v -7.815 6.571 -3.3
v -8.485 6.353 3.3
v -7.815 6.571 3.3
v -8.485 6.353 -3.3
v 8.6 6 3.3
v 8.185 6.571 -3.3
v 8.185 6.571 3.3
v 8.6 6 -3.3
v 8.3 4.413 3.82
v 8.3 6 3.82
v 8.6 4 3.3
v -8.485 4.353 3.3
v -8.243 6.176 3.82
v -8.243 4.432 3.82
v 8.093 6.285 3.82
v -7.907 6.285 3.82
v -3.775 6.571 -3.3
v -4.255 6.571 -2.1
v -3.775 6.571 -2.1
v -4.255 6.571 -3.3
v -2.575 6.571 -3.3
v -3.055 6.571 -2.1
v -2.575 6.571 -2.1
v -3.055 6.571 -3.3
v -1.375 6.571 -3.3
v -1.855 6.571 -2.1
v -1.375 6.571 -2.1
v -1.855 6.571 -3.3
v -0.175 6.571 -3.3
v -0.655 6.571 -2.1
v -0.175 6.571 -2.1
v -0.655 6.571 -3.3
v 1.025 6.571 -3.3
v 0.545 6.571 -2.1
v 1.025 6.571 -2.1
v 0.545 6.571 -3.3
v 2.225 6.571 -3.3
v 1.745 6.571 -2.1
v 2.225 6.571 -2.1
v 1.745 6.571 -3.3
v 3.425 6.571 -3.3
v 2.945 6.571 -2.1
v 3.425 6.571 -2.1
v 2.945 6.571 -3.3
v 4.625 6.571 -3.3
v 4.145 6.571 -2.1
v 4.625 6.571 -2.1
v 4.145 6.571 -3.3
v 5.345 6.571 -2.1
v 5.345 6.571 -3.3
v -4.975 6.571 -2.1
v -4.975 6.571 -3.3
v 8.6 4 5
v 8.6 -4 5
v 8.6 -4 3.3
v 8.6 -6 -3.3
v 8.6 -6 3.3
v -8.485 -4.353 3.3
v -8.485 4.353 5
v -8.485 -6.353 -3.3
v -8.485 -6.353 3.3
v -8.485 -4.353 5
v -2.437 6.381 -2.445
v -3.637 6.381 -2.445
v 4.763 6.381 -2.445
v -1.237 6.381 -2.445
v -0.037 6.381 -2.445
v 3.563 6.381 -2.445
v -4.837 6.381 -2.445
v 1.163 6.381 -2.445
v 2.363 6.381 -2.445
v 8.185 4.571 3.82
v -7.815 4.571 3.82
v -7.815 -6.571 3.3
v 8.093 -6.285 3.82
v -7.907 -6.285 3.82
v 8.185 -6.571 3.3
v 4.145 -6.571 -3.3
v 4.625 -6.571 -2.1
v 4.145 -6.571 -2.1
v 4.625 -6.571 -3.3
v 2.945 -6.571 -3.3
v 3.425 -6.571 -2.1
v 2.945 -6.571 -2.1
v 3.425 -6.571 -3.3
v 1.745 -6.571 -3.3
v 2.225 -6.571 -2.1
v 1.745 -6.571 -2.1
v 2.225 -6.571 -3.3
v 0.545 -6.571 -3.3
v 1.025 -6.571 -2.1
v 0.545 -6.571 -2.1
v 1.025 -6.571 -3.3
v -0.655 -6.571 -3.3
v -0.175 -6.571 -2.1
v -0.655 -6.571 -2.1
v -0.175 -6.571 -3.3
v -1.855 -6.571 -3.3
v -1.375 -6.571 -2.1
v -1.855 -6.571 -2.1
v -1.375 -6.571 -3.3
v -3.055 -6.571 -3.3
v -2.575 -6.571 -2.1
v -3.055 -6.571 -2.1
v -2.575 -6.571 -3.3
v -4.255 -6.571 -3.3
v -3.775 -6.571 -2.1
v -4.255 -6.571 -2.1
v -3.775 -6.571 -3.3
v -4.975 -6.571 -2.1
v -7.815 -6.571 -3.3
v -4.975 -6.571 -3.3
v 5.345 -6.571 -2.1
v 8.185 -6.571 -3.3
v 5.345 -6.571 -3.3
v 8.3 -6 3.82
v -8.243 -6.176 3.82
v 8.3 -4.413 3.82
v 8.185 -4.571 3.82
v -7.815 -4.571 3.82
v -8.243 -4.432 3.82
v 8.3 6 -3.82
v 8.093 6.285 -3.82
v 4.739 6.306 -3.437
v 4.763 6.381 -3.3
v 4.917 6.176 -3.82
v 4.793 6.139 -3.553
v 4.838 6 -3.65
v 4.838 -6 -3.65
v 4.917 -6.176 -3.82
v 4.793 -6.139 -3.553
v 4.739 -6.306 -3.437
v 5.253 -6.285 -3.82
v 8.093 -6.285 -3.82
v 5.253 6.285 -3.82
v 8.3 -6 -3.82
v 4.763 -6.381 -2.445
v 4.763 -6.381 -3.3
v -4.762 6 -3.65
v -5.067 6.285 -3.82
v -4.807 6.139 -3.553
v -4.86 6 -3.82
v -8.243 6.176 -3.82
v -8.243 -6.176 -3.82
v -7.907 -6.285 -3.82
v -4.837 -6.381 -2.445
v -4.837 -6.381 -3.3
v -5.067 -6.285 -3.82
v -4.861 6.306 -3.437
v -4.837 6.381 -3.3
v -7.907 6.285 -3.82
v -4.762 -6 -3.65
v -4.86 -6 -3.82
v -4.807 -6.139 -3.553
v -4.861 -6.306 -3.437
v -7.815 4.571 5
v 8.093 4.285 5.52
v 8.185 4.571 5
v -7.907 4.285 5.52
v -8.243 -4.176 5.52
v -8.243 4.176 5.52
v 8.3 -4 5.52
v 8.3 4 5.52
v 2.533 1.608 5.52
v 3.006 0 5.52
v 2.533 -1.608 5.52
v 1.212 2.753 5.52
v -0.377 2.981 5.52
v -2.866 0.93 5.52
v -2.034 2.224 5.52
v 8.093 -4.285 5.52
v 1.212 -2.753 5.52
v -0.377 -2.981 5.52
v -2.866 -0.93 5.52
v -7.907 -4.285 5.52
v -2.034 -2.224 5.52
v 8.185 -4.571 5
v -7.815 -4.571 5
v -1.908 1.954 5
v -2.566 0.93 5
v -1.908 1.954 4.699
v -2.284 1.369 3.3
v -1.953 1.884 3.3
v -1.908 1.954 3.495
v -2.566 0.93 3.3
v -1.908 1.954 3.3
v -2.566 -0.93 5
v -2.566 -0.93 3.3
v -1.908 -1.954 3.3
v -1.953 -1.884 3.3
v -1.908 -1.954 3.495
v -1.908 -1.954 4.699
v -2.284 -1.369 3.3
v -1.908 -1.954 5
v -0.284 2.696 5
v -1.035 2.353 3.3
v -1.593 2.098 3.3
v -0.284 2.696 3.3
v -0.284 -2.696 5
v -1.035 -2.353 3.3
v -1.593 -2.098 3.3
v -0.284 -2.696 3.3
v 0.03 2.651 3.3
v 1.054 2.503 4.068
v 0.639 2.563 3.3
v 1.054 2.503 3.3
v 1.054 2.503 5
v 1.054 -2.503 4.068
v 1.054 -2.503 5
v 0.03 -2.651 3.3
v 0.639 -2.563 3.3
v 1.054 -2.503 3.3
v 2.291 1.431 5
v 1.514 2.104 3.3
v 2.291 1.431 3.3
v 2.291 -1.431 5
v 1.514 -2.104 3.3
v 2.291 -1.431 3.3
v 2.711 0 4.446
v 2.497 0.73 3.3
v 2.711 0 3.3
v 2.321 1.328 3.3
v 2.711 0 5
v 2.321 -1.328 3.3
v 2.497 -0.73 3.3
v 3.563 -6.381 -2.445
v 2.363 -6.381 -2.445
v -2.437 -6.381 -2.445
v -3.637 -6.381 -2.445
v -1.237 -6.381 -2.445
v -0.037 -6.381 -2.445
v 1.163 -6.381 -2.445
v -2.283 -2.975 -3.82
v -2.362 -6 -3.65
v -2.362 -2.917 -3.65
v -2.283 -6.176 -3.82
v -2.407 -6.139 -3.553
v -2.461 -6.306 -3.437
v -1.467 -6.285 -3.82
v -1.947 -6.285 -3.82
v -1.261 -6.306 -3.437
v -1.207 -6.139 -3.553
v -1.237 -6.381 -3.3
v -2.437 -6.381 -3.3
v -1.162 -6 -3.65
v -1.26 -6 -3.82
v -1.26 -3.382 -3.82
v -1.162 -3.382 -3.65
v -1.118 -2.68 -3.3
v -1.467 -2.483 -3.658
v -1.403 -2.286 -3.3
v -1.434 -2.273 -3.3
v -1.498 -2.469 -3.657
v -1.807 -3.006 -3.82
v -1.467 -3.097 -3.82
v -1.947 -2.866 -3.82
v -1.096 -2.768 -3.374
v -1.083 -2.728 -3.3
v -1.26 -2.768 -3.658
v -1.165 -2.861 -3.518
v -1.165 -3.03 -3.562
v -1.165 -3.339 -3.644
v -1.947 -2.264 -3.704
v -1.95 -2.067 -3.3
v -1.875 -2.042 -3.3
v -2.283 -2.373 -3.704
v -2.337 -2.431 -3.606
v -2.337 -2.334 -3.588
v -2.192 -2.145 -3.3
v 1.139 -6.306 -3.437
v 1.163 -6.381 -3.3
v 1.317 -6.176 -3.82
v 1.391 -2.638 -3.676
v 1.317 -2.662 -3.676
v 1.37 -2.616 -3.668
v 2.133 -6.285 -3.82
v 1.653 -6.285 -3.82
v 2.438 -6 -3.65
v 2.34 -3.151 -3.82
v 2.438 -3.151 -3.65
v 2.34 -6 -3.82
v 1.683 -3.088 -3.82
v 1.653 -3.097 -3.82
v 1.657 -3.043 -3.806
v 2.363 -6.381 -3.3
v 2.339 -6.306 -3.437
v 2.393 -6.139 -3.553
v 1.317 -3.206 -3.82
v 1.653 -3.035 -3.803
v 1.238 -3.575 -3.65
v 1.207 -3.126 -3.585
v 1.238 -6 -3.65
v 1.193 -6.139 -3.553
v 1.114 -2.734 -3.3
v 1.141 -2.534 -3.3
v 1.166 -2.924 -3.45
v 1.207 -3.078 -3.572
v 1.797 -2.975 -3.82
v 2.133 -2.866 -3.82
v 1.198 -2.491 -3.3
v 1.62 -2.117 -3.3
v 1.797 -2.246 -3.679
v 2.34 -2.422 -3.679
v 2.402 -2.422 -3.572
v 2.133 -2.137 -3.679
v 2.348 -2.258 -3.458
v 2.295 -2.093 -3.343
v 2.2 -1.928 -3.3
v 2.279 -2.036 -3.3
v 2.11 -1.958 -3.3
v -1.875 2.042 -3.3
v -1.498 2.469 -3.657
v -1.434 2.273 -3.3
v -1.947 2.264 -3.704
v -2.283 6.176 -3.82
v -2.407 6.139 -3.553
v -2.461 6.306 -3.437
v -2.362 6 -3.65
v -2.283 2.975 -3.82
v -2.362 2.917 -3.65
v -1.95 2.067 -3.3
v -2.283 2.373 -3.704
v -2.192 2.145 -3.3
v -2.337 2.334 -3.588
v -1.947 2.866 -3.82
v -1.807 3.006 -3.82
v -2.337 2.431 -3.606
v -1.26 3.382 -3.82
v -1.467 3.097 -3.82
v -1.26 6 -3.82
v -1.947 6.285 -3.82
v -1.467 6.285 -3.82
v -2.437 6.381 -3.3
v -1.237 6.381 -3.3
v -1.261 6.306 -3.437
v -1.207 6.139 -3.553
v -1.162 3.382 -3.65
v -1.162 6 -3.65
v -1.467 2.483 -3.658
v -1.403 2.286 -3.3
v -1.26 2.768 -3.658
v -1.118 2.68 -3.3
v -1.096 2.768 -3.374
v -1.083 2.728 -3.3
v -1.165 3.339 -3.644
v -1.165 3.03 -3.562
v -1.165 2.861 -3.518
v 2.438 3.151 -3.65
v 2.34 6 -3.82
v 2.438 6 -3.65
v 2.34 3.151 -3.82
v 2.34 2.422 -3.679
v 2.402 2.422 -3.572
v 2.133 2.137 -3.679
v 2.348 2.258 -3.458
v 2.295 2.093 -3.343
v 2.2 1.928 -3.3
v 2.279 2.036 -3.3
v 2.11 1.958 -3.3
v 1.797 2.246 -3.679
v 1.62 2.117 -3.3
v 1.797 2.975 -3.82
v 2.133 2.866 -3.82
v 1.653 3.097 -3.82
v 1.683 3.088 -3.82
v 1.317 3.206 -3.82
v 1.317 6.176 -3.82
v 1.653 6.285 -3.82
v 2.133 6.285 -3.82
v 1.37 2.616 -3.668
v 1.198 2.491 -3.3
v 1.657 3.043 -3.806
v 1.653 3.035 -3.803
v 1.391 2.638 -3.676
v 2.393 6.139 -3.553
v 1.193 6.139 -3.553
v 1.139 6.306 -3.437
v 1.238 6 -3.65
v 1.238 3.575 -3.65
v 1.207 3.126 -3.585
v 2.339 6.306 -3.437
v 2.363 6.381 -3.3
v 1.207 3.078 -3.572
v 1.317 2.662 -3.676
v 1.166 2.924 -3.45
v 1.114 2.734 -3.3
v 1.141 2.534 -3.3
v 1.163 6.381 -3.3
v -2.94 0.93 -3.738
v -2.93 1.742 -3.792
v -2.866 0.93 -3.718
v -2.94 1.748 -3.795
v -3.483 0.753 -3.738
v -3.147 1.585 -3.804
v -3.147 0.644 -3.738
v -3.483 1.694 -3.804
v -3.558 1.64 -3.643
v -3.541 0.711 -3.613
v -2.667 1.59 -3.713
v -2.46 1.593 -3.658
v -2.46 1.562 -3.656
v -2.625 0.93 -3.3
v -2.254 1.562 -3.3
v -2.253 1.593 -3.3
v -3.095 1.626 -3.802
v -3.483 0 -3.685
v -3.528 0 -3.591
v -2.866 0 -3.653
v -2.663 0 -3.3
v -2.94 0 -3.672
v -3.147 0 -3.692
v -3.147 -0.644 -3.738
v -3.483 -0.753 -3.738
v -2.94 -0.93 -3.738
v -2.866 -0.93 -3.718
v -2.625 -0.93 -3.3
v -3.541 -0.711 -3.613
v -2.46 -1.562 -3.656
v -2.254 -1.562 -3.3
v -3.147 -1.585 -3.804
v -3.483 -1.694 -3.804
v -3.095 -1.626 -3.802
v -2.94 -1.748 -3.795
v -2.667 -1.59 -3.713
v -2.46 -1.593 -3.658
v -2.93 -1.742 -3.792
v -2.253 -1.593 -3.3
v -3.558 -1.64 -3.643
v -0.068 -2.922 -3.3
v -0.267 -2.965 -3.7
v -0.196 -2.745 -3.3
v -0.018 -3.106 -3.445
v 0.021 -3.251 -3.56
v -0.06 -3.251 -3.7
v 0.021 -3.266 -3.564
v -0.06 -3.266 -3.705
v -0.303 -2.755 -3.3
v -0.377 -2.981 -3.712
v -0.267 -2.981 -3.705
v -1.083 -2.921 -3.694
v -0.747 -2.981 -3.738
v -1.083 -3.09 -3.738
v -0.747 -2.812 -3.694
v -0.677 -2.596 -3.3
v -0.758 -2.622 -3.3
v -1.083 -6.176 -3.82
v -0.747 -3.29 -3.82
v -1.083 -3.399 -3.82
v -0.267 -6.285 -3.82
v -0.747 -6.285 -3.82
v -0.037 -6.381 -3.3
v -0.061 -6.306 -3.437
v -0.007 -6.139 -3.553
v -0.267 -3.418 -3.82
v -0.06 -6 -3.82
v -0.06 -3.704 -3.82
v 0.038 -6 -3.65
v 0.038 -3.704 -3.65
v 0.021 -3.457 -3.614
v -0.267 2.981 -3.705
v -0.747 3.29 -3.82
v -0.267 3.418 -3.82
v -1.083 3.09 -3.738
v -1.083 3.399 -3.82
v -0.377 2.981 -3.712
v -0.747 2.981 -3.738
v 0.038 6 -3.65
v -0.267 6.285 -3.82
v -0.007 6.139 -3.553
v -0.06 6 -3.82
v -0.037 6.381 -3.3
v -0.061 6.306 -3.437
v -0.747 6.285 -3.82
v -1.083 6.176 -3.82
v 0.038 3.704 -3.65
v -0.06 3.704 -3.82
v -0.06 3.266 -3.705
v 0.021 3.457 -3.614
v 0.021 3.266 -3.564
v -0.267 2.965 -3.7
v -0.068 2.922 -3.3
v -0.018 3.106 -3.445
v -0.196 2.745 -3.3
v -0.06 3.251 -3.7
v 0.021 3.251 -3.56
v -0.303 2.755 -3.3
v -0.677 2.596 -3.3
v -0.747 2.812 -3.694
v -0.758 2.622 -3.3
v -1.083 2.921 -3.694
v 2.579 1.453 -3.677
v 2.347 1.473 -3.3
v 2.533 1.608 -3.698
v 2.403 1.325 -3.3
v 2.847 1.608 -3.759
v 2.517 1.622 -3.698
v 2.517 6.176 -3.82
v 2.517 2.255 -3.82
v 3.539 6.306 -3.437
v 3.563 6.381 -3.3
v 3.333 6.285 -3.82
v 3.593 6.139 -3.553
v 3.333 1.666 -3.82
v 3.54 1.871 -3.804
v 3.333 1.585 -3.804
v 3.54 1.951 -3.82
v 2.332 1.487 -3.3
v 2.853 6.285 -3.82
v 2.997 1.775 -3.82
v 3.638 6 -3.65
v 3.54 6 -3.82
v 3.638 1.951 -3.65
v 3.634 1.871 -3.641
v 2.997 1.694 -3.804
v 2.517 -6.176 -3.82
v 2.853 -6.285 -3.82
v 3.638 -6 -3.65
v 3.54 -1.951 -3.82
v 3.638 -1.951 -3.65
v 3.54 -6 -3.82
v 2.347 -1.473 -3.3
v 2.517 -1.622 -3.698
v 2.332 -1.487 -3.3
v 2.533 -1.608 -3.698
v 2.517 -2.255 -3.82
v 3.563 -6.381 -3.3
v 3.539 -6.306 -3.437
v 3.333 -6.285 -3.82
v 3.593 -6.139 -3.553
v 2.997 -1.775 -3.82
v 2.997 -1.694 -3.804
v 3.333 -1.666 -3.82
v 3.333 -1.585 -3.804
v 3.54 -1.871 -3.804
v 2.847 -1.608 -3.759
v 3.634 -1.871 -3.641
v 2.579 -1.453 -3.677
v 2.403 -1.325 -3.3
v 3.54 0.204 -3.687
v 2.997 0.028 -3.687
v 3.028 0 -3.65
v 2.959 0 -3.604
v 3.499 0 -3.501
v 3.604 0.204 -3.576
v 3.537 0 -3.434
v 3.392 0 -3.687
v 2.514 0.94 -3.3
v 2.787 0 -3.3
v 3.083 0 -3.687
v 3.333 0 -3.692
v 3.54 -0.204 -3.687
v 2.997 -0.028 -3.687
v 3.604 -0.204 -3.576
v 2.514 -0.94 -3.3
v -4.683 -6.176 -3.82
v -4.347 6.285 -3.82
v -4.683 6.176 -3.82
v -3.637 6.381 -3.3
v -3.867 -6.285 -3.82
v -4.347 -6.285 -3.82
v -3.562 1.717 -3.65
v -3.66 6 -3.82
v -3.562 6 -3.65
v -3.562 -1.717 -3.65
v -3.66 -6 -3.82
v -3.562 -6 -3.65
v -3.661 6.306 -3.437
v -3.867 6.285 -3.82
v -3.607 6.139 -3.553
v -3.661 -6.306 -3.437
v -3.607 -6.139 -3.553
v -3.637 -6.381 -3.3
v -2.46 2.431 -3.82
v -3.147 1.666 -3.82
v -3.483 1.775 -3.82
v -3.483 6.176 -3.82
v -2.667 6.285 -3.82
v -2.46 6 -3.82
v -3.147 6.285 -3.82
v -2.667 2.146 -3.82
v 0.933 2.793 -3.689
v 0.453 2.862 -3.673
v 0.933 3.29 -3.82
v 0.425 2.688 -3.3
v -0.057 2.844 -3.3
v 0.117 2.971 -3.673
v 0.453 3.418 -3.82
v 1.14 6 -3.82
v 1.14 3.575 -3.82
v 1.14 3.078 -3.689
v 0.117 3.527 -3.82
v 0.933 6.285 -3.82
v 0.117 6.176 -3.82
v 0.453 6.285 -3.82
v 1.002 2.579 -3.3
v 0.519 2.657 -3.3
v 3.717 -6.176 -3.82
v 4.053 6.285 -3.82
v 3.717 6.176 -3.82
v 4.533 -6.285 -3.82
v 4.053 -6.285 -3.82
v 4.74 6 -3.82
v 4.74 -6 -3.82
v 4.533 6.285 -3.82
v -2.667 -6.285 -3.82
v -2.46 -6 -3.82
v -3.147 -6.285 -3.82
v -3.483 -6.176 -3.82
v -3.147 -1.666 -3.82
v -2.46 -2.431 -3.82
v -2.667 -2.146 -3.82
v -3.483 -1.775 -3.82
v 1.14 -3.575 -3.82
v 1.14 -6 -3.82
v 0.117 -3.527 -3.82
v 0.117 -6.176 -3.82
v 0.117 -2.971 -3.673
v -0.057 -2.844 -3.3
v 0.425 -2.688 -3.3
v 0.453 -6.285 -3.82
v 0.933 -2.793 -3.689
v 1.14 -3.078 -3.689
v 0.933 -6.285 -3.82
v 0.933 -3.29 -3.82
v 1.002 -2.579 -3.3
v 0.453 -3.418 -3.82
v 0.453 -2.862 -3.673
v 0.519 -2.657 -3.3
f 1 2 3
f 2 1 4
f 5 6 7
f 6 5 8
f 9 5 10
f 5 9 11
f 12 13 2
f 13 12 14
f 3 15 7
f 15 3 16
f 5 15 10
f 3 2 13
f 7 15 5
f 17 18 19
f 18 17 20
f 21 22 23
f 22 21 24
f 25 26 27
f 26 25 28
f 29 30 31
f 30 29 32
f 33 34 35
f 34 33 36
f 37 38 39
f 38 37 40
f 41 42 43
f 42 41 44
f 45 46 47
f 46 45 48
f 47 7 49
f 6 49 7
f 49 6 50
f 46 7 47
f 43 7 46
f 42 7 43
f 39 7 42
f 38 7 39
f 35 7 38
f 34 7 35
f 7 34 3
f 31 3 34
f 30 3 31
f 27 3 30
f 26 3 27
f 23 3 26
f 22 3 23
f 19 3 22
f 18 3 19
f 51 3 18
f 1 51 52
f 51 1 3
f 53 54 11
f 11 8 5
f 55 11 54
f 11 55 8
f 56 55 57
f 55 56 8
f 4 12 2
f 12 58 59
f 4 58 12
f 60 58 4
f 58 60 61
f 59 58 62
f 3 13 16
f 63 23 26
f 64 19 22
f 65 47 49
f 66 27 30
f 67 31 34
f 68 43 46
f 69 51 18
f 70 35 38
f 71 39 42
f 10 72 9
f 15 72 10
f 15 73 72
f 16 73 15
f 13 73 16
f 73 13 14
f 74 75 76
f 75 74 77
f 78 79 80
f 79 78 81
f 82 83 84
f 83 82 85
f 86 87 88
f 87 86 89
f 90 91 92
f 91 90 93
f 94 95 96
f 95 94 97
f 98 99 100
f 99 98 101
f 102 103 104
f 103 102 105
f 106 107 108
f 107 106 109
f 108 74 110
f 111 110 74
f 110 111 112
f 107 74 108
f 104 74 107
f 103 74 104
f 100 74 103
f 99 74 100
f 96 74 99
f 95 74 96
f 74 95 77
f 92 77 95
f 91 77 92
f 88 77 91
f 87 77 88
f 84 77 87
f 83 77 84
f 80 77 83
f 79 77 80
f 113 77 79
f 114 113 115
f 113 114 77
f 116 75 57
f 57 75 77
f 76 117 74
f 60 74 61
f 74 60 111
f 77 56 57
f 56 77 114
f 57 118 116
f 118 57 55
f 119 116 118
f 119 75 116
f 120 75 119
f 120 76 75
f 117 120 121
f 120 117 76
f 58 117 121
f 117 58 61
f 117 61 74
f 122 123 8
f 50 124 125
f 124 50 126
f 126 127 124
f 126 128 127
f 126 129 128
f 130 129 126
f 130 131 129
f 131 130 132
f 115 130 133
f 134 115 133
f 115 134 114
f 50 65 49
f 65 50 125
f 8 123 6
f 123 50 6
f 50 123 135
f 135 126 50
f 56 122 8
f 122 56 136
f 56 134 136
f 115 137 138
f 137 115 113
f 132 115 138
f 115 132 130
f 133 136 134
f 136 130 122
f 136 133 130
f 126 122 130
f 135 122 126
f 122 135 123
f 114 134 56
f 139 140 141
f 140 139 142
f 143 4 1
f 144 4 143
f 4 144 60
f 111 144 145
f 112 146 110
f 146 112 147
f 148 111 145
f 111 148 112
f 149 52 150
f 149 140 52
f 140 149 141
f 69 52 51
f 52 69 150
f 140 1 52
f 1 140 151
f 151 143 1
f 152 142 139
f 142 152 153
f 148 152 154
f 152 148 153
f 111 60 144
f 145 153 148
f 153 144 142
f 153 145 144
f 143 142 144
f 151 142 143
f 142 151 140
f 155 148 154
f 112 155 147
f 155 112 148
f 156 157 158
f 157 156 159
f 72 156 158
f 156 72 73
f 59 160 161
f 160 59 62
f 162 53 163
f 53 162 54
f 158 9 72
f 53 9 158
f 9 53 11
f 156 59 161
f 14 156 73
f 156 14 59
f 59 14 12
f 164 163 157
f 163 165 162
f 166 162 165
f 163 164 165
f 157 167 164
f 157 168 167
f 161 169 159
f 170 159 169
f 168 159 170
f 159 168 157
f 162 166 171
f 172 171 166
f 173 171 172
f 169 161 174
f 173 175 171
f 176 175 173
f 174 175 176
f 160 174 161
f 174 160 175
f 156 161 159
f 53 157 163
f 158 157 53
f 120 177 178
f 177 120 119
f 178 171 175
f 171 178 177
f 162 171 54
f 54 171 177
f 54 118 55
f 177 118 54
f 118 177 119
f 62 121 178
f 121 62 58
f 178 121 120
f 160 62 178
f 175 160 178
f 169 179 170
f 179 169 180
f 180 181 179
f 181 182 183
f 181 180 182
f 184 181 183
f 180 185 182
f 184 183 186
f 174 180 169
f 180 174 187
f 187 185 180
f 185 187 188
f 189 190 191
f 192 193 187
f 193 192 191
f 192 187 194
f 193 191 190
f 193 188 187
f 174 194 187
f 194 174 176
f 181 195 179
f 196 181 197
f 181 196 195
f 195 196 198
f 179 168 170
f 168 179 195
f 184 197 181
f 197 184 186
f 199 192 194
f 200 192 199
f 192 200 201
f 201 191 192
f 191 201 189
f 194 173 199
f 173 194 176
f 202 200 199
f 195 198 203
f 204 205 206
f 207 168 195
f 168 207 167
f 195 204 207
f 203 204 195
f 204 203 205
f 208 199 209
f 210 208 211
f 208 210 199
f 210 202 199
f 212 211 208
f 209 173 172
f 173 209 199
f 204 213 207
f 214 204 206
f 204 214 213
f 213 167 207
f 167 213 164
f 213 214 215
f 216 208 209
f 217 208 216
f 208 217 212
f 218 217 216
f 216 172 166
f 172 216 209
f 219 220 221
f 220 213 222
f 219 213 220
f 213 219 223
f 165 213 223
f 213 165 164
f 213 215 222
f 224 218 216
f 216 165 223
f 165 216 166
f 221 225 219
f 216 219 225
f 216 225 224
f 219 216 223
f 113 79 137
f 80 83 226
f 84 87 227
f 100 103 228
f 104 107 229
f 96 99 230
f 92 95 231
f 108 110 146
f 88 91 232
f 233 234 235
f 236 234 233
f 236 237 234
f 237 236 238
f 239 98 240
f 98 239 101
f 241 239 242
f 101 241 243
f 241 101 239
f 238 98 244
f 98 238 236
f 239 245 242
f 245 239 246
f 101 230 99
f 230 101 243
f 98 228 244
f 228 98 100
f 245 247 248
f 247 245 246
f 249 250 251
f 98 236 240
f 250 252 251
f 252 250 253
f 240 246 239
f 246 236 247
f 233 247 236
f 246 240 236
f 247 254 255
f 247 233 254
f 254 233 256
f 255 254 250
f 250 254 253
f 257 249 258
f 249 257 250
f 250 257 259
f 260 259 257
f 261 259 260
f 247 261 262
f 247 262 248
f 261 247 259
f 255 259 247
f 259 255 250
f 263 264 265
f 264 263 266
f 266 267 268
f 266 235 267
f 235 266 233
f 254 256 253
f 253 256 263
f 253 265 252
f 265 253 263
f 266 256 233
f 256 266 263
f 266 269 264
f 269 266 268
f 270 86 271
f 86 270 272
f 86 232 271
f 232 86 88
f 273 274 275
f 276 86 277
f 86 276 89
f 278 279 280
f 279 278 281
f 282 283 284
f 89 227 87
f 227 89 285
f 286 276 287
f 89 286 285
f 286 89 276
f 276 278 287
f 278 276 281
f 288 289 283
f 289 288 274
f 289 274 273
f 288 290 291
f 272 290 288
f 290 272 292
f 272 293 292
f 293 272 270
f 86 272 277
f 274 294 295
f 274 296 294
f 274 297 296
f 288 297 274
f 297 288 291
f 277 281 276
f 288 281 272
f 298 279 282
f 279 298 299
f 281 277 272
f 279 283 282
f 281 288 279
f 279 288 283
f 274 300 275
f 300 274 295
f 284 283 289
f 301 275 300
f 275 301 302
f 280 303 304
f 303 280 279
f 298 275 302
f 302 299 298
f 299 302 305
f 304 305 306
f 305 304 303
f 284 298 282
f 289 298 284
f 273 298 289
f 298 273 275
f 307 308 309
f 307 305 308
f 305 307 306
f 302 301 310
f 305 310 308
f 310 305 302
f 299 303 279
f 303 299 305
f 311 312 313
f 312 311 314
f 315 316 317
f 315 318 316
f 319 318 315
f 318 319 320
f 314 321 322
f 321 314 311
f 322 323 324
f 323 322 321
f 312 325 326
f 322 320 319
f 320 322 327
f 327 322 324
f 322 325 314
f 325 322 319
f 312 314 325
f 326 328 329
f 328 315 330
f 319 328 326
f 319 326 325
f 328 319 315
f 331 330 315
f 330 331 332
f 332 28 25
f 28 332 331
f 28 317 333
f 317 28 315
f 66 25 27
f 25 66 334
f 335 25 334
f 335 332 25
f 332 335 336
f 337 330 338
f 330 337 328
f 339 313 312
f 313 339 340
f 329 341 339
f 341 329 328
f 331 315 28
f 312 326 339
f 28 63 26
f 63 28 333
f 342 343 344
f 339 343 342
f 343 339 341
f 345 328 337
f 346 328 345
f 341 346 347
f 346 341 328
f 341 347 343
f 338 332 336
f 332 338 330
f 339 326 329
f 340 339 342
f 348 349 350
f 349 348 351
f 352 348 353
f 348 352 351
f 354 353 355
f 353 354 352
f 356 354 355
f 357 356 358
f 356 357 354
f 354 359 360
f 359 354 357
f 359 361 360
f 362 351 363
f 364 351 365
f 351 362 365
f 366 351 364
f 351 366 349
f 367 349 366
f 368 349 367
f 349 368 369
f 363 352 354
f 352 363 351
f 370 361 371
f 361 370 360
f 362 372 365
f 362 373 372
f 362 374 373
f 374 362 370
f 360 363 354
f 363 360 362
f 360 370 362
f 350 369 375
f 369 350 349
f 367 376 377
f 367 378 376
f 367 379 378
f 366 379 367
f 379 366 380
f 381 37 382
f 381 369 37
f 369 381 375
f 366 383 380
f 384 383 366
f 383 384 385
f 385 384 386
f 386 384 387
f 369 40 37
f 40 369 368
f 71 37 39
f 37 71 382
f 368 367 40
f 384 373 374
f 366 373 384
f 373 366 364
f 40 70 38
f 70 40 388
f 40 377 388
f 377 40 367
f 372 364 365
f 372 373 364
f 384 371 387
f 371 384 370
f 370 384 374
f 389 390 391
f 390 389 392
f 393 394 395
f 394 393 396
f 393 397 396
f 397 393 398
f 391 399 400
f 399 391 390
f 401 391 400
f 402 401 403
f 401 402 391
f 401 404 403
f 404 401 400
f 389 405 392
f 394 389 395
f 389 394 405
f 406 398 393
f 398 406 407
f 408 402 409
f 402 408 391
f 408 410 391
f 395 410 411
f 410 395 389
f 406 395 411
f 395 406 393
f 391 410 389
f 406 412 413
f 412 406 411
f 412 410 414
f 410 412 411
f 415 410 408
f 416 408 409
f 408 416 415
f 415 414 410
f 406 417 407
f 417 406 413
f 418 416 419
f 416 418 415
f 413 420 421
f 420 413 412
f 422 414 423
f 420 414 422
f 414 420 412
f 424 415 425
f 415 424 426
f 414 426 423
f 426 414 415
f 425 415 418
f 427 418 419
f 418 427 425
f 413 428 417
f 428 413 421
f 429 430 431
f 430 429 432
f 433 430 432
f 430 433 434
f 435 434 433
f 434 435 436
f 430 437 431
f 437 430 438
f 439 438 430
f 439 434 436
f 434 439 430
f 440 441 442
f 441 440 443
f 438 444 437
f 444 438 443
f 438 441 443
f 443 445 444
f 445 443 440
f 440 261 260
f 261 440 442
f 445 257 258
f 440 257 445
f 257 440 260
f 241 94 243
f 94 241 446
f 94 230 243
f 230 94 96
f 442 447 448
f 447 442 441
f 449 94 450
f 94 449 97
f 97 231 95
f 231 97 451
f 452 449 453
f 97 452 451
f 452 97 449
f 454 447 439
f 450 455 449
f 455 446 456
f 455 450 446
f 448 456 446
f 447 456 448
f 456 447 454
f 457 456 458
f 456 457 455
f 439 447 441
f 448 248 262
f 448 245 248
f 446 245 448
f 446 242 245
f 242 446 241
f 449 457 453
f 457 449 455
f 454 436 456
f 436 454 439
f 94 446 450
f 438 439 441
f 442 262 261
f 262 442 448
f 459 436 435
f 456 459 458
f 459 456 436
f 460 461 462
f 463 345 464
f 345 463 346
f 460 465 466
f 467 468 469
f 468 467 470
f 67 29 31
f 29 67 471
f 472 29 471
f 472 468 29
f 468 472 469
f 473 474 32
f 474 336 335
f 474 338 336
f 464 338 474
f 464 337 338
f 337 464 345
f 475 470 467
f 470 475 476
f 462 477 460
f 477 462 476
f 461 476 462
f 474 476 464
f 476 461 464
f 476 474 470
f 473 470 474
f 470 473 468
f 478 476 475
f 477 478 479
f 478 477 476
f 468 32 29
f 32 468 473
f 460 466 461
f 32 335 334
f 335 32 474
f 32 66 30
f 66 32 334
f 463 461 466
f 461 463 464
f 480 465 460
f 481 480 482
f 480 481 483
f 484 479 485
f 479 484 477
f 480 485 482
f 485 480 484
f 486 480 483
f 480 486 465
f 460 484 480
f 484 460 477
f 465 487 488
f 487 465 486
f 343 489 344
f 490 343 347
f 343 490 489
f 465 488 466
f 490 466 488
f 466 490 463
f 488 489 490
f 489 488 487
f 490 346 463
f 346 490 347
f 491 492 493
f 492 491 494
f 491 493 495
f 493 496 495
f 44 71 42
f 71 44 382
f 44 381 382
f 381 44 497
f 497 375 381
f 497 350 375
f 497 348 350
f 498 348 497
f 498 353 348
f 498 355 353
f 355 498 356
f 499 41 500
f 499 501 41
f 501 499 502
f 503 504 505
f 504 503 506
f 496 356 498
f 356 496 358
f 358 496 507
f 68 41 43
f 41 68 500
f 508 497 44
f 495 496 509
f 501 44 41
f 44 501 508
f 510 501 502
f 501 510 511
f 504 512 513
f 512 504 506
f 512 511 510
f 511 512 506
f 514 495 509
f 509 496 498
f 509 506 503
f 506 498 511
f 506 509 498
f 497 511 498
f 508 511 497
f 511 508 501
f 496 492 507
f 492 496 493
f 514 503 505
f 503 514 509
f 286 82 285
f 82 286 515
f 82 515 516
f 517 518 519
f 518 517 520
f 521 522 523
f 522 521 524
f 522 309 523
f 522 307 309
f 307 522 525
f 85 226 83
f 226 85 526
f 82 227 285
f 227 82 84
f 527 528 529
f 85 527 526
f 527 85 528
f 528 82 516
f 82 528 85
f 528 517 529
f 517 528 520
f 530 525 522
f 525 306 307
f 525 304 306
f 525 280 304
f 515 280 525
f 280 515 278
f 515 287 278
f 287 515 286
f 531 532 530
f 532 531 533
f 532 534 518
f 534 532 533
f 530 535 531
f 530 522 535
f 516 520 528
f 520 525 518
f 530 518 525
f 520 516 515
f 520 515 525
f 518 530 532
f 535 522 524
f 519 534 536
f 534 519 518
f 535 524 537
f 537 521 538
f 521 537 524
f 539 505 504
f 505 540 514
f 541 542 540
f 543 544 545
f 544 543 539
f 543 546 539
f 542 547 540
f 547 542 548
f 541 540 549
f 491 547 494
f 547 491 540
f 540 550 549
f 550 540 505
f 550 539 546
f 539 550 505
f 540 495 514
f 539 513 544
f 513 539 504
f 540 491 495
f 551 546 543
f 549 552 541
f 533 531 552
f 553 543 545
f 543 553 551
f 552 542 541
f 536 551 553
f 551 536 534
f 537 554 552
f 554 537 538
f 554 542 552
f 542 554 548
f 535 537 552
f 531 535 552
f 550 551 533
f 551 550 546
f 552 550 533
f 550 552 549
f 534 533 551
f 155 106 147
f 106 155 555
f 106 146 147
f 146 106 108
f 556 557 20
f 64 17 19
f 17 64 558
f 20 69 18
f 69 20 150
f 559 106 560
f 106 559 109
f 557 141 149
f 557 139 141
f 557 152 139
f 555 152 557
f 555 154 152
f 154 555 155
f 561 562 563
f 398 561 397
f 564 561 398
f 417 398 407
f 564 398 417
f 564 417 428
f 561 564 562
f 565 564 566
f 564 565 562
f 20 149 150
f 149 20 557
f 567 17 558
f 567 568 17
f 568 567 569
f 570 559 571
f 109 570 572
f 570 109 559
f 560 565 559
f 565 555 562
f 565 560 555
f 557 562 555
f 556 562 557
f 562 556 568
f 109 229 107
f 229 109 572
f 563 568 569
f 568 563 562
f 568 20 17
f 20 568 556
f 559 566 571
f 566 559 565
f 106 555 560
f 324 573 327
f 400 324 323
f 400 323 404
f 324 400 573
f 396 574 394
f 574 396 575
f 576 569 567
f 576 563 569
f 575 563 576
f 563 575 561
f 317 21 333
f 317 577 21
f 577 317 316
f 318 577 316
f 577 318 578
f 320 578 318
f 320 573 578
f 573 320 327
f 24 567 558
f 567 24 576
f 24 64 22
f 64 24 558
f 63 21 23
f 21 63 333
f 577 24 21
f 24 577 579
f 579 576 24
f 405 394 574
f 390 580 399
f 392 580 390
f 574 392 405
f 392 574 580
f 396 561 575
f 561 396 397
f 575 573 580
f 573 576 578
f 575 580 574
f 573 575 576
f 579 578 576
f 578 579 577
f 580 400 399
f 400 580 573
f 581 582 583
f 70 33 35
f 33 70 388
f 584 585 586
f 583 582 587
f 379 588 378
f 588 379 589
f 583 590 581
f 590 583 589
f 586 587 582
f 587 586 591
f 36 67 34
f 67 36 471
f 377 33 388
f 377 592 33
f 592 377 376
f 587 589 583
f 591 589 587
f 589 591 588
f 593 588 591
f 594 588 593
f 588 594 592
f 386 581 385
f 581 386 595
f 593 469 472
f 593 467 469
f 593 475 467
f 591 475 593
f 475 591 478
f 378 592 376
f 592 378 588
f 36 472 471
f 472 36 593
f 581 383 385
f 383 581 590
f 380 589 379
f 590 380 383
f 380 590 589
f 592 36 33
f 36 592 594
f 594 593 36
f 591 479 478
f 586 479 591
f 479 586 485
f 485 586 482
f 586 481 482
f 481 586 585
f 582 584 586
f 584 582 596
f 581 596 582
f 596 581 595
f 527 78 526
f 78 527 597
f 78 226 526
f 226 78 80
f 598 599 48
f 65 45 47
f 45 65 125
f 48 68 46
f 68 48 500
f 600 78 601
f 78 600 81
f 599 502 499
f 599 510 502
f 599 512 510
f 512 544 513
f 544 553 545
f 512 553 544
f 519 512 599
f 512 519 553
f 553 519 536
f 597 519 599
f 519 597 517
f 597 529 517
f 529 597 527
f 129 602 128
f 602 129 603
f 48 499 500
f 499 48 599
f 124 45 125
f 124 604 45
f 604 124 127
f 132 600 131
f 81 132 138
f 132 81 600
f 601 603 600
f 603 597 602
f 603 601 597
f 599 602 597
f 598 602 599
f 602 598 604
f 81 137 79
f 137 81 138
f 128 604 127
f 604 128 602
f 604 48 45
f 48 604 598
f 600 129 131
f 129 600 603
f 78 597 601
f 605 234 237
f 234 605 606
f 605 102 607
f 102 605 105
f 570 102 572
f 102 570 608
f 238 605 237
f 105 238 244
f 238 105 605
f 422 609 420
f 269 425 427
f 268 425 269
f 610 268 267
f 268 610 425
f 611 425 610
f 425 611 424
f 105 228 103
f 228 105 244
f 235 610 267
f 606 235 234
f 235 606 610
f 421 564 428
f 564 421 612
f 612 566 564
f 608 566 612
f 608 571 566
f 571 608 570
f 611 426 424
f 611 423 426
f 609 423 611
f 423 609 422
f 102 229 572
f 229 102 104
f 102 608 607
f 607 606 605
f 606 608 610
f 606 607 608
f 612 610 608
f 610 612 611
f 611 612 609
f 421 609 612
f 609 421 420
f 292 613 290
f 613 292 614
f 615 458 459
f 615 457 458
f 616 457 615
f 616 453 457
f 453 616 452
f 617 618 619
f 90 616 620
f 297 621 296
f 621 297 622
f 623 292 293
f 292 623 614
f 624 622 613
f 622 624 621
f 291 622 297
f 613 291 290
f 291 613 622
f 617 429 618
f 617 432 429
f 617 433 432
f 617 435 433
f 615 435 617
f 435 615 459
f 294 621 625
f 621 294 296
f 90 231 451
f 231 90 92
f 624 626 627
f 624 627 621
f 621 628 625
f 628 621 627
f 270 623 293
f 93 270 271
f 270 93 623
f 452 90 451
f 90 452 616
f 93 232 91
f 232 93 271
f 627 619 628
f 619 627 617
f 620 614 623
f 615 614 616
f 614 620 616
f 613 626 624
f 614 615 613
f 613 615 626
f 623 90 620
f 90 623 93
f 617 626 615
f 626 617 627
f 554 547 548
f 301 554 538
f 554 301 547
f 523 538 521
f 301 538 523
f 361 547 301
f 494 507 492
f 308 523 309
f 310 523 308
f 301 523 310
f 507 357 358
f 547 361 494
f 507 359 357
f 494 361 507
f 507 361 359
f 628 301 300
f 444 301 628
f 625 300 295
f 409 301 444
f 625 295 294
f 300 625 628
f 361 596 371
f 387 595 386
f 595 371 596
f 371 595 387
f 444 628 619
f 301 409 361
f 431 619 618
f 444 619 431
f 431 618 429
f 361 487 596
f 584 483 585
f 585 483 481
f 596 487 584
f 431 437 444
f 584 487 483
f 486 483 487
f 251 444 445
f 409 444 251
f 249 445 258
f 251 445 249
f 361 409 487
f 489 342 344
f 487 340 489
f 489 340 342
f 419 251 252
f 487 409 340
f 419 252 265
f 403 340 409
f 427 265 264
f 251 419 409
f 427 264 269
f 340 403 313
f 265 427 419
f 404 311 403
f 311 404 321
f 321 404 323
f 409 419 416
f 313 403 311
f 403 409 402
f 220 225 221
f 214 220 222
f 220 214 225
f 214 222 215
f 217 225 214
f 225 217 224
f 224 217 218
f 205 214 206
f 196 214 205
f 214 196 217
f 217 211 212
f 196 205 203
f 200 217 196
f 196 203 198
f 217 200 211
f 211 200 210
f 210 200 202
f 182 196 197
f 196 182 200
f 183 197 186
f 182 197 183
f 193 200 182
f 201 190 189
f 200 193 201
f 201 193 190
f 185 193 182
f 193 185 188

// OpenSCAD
// Parameters
screw_d = 6.0; //[3.0:12.0:0.1]
hex_af = 8.0; //[4.0:16.0:0.1]
thickness = 6.6; //[3.3:13.2:0.1]
hole_clearance_d = 6.6; //[6.0:8.0:0.1]
t_body_L = 16.0; //[8.0:32.0:0.1]
t_body_W = 12.0; //[6.0:24.0:0.1]
t_neck_W = 8.0; //[4.0:16.0:0.1]
t_neck_H = 2.5; //[1.0:5.0:0.1]
chamfer = 0.5; //[0.2:1.5:0.1]
edge_fillet_r = 0.6; //[0.2:1.5:0.1]
serration_pitch = 1.2; //[0.6:2.4:0.1]
serration_depth = 0.4; //[0.1:1.0:0.05]
serration_count = 9; //[3:21:1]
thread_pilot_d = 5.0; //[4.0:6.0:0.1]
thread_pilot_enable = 0; //[0:1:1]
overlap = 0.8; //[0.5:2.0:0.1]

// Base Shapes
module t_slot_nut_body_main_block() {
  cube([t_body_L, t_body_W, thickness], center=true);
}

module t_slot_nut_body_neck_block() {
  translate([0, 0, thickness/2 + t_neck_H/2 - overlap])
    cube([t_body_L, t_neck_W, t_neck_H], center=true);
}

module central_screw_hole_clearance() {
  translate([0, 0, t_neck_H/2 - overlap/2])
    cylinder(h=thickness + t_neck_H + 2*overlap, r=hole_clearance_d/2, center=true);
}

module central_screw_hole_thread_pilot() {
  translate([0, 0, t_neck_H/2 - overlap/2])
    cylinder(h=thickness + t_neck_H + 2*overlap, r=thread_pilot_d/2, center=true);
}

module hex_across_flats_profile_prism() {
  translate([0, 0, 0])
    linear_extrude(height=thickness, center=true)
      polygon(points=[
        [hex_af/2, 0],
        [hex_af/4, hex_af*0.4330127019],
        [-hex_af/4, hex_af*0.4330127019],
        [-hex_af/2, 0],
        [-hex_af/4, -hex_af*0.4330127019],
        [hex_af/4, -hex_af*0.4330127019]
      ]);
}

module lead_in_chamfer_top_cone() {
  translate([0, 0, thickness/2 - chamfer])
    cylinder(h=chamfer*2, r1=hole_clearance_d/2 + chamfer, r2=0, center=true);
}

module lead_in_chamfer_bottom_cone() {
  translate([0, 0, -thickness/2 + chamfer])
    cylinder(h=chamfer*2, r1=hole_clearance_d/2 + chamfer, r2=0, center=true);
}

module serration_groove(pos) {
  translate([pos, 0, -thickness/2 + serration_depth/2])
    cube([serration_pitch*0.6, t_body_W + 2*overlap, serration_depth + 2*overlap], center=true);
}

module edge_fillet_kernel_sphere() {
  sphere(r=edge_fillet_r, center=true);
}

// Operations
module t_slot_nut_body_union() {
  union() {
    t_slot_nut_body_main_block();
    t_slot_nut_body_neck_block();
  }
}

module knurling_or_serrations_union() {
  union() {
    for (i = [0:serration_count-1]) {
      serration_groove(-(serration_count-1)*serration_pitch/2 + i*serration_pitch);
    }
  }
}

module lead_in_chamfers_union() {
  union() {
    lead_in_chamfer_top_cone();
    lead_in_chamfer_bottom_cone();
  }
}

module central_screw_hole_selected() {
  if (thread_pilot_enable == 0)
    central_screw_hole_clearance();
  else
    central_screw_hole_thread_pilot();
}

module t_slot_nut_body_with_hole_and_features_raw() {
  difference() {
    t_slot_nut_body_union();
    central_screw_hole_selected();
    lead_in_chamfers_union();
    knurling_or_serrations_union();
  }
}

module edge_fillets_minkowski() {
  minkowski() {
    t_slot_nut_body_with_hole_and_features_raw();
    edge_fillet_kernel_sphere();
  }
}

module final_t_slot_nut_model() {
  union() {
    edge_fillets_minkowski();
    hex_across_flats_profile_prism();
  }
}

// Final Output
final_t_slot_nut_model();
